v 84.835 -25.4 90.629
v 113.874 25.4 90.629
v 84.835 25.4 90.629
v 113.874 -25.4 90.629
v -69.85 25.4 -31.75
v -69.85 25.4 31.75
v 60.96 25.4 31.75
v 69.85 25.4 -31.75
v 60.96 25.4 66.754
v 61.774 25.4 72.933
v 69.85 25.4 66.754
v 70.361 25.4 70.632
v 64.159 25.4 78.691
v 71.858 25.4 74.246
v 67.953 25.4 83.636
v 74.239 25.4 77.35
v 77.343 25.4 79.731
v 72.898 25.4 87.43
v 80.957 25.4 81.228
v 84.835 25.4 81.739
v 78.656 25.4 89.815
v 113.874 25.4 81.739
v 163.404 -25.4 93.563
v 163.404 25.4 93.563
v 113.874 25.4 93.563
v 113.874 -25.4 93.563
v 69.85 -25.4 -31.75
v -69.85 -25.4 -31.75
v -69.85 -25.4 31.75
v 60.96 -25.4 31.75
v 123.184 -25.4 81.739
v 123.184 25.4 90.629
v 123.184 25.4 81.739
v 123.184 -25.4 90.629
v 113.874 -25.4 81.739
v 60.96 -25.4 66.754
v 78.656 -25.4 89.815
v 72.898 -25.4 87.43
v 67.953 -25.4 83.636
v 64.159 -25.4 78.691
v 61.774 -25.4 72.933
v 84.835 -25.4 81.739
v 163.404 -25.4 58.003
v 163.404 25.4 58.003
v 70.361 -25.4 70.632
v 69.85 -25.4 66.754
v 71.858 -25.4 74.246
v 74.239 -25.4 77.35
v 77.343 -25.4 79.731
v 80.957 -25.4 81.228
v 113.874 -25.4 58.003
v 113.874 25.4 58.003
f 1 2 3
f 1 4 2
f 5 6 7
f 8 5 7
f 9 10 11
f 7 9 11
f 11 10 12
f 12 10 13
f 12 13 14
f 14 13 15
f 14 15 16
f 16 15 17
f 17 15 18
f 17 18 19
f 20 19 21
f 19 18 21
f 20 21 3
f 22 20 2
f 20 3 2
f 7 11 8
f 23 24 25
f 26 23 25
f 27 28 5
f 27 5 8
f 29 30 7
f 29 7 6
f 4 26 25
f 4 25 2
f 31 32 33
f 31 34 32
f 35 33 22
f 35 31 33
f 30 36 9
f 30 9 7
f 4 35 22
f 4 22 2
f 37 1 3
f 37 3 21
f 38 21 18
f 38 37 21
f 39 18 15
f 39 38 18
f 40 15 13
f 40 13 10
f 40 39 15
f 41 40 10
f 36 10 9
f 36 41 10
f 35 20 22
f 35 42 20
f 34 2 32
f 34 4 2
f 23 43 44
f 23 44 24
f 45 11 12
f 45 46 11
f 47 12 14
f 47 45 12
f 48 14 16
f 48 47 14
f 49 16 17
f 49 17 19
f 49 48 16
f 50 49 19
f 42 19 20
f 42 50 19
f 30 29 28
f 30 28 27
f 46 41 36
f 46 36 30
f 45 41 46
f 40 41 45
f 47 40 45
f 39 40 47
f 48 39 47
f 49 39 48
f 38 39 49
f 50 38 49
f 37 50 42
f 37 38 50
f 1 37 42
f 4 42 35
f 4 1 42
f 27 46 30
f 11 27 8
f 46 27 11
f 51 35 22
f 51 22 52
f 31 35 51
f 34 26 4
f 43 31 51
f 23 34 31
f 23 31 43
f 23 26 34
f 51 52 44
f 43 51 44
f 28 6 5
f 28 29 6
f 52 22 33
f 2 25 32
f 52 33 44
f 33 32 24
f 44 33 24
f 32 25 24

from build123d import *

# Parameters (mm, degrees)
F1_DEPTH = 25.4


with BuildPart() as f1:
    # F0 (on Front) → F1 (new body, symmetric)
    with BuildSketch(Plane.XZ):
        Polygon((-69.85, 31.75), (-69.85, -31.75), (69.85, -31.75), (69.85, 31.75), (60.96, 31.75), align=None)
        with BuildLine():
            Line((60.96, 31.75), (69.85, 31.75))
            Line((69.85, 31.75), (69.85, 66.75354))
            ThreePointArc((69.85, 66.75354), (74.239148, 77.349881), (84.835489, 81.739029))
            Line((84.835489, 81.739029), (113.873671, 81.739029))
            Line((113.873671, 81.739029), (113.873671, 90.629029))
            Line((113.873671, 90.629029), (84.835489, 90.629029))
            ThreePointArc((84.835489, 90.629029), (67.952969, 83.63606), (60.96, 66.75354))
            Line((60.96, 66.75354), (60.96, 31.75))
        make_face()
        Polygon((123.183624, 81.739029), (113.873671, 81.739029), (113.873671, 58.002657), (163.403671, 58.002657), (163.403671, 93.562657), (113.873671, 93.562657), (113.873671, 90.629029), (123.183624, 90.629029), align=None)
    extrude(amount=F1_DEPTH, both=True)


solid = f1.part
